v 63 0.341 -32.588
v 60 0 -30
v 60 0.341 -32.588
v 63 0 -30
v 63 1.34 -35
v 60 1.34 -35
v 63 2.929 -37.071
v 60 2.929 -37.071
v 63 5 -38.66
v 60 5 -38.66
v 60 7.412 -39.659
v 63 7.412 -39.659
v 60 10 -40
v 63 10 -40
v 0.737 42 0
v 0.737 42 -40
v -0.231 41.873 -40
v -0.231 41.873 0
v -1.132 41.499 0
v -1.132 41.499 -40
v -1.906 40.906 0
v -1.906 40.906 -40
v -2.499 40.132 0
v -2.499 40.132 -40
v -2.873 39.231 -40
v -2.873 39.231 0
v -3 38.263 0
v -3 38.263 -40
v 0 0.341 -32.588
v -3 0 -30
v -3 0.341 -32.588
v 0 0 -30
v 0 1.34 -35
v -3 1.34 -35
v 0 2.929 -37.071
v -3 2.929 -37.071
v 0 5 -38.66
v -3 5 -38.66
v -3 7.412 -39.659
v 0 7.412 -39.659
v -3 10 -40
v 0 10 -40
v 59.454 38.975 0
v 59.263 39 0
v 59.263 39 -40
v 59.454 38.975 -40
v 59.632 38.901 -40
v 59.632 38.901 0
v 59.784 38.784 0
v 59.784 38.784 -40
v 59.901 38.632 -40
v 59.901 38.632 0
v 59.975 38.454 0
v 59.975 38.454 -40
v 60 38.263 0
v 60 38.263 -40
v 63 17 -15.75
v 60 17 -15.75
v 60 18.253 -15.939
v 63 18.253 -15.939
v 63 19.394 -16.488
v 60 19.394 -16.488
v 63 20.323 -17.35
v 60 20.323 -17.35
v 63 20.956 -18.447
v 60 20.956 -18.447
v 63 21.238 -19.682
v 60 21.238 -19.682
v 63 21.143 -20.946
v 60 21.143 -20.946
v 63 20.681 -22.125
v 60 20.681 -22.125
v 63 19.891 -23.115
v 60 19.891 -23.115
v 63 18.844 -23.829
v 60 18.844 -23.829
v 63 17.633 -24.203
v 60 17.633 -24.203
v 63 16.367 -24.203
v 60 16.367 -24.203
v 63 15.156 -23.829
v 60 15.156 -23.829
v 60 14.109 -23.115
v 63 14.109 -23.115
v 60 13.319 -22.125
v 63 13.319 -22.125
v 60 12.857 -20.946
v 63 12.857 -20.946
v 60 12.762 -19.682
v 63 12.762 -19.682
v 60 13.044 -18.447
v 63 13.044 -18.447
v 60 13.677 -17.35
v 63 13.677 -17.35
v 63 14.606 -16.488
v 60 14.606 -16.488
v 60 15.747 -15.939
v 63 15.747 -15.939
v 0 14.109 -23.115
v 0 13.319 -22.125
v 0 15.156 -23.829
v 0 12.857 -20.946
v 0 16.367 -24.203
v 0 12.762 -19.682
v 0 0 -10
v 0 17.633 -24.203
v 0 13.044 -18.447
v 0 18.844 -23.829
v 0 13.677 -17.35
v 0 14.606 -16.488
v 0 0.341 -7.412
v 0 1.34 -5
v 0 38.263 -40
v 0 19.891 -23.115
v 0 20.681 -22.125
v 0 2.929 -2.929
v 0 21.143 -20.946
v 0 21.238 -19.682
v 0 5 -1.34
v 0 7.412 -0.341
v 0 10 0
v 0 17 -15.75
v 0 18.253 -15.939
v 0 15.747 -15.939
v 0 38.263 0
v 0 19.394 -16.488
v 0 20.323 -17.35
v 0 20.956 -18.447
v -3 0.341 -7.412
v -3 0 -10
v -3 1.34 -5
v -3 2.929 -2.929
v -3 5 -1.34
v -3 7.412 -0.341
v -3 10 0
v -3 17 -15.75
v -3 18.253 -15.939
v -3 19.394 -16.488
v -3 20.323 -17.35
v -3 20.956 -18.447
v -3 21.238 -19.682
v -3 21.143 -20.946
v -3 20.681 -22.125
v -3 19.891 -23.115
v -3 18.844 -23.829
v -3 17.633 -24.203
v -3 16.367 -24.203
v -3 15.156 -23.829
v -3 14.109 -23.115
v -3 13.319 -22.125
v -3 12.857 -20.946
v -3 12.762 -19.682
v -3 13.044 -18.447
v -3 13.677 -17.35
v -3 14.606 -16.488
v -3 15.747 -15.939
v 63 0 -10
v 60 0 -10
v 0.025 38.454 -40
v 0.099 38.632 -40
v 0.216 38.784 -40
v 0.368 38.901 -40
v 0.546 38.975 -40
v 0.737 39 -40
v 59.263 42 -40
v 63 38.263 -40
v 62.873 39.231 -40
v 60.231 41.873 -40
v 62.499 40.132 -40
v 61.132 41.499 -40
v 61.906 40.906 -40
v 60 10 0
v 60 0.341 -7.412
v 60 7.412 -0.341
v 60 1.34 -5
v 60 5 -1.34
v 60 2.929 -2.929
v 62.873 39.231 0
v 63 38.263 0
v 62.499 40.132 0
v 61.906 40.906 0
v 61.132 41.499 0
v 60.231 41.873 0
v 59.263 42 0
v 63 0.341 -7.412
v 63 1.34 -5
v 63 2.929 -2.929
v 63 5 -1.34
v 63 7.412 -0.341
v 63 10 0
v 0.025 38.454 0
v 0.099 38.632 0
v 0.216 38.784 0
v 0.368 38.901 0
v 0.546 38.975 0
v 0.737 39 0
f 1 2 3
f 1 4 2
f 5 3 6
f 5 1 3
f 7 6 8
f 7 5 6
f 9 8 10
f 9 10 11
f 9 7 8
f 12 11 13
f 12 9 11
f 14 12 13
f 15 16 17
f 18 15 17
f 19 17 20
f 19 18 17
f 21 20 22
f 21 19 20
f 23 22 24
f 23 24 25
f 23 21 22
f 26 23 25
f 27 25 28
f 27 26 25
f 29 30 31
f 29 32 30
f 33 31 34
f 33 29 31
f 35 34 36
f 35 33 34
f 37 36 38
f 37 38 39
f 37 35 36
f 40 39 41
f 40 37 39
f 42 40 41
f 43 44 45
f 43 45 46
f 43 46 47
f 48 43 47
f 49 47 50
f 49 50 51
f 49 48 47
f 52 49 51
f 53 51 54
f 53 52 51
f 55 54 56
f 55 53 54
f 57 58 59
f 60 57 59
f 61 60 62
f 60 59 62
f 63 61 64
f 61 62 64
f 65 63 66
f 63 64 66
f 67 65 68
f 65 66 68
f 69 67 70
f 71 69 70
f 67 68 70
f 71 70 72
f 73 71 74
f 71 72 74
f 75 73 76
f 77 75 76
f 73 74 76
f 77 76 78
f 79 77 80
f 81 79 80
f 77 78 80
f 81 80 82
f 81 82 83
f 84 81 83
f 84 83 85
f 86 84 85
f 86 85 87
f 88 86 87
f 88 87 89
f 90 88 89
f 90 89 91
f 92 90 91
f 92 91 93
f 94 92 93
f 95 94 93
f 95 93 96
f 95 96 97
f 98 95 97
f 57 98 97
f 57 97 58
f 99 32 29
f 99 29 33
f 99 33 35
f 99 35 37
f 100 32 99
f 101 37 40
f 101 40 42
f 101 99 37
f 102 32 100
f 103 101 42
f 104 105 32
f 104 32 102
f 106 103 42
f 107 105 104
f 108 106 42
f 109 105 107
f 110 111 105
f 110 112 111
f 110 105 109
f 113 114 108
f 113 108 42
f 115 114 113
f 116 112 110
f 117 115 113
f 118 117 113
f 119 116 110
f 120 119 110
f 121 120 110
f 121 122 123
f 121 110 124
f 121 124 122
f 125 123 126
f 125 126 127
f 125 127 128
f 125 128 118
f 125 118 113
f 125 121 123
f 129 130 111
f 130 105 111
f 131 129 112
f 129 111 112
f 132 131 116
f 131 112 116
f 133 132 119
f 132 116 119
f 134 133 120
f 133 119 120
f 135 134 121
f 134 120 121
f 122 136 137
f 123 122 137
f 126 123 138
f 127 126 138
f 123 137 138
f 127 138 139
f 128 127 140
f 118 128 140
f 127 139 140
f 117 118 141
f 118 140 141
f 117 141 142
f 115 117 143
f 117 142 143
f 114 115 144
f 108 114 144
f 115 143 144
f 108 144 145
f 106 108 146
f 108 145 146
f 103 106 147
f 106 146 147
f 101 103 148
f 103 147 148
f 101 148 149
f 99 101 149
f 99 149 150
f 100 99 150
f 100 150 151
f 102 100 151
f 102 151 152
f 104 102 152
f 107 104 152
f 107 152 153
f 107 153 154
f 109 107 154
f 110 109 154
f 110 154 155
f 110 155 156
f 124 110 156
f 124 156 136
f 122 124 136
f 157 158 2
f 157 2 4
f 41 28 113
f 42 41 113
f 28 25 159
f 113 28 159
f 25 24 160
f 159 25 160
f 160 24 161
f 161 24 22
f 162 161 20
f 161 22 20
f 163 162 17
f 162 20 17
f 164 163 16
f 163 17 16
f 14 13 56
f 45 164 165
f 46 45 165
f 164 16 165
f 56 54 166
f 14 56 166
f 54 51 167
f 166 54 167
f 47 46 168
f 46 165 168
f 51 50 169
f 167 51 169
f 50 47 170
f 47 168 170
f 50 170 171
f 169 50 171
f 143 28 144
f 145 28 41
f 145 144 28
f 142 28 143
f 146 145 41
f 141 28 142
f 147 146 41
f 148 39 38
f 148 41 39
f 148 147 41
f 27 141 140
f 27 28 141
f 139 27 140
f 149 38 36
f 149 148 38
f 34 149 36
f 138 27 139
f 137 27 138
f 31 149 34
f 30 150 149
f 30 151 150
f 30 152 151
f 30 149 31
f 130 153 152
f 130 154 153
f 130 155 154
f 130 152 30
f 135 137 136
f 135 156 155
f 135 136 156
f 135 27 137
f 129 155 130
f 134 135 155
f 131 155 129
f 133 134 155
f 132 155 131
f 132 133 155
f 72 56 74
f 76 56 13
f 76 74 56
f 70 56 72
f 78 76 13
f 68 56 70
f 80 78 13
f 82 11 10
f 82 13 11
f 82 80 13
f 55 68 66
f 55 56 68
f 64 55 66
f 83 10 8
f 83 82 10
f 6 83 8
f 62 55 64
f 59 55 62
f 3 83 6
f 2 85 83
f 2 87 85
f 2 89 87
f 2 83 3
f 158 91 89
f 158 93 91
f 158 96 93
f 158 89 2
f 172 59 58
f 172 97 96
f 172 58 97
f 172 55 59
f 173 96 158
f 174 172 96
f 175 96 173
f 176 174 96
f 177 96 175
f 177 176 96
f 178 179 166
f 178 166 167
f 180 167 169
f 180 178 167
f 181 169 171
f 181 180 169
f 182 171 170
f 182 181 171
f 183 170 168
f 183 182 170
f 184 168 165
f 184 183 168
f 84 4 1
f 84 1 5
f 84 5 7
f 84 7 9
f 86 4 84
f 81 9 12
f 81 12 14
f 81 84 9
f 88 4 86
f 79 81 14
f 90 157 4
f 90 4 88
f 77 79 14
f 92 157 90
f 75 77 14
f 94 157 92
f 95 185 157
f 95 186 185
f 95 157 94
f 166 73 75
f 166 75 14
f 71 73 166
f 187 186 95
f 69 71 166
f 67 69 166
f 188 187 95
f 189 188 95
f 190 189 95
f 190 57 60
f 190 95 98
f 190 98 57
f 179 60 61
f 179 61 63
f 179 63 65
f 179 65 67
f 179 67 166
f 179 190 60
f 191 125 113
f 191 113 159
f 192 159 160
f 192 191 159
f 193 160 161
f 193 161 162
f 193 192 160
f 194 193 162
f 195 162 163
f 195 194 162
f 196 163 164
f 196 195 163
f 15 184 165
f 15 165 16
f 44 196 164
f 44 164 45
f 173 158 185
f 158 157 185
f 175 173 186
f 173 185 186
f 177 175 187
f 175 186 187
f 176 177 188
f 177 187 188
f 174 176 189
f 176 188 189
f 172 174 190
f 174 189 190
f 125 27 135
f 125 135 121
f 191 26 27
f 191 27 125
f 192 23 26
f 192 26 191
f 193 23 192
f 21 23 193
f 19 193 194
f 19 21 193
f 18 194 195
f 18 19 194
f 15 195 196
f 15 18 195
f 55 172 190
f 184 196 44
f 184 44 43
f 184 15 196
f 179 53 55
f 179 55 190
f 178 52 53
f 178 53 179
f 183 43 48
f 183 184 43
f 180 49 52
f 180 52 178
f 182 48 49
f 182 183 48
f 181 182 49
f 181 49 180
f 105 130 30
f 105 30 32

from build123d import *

# Parameters (mm, degrees)
BASE_FLANGE1_DEPTH = 40
FILLET1_R          = 10
SKETCH6_R          = 4.25
CUT_EXTRUDE1_DEPTH = 88.863530546


# Sheet-metal steps are written as plain solids
with BuildPart() as part:
    # Sketch1 → Base-Flange1 (new body)
    with BuildSketch(Plane.XY):
        with BuildLine():
            Line((0, 0), (0, 38.2634))
            ThreePointArc((0, 38.2634), (0.215745145, 38.784254855), (0.7366, 39))
            Line((0.7366, 39), (59.2634, 39))
            ThreePointArc((59.2634, 39), (59.784254855, 38.784254855), (60, 38.2634))
            Line((60, 38.2634), (60, 0))
            Line((60, 0), (63, 0))
            Line((63, 0), (63, 38.2634))
            ThreePointArc((63, 38.2634), (61.905575199, 40.905575199), (59.2634, 42))
            Line((59.2634, 42), (0.7366, 42))
            ThreePointArc((0.7366, 42), (-1.905575199, 40.905575199), (-3, 38.2634))
            Line((-3, 38.2634), (-3, 0))
            Line((-3, 0), (0, 0))
        make_face()
    extrude(amount=-BASE_FLANGE1_DEPTH)

    # Fillet1
    fillet1_edges = [part.edges().sort_by_distance(p)[0] for p in [
        (-1.5, 0, 0),
        (61.5, 0, 0),
        (-1.5, 0, -40),
        (61.5, 0, -40),
    ]]
    fillet(fillet1_edges, radius=FILLET1_R)

    # Sketch6 → Cut-Extrude1 (cut, through all)
    with BuildSketch(Plane.ZY.offset(3)):
        with Locations((-20, 17)):
            Circle(SKETCH6_R)
    extrude(amount=-CUT_EXTRUDE1_DEPTH, mode=Mode.SUBTRACT)


solid = part.part
